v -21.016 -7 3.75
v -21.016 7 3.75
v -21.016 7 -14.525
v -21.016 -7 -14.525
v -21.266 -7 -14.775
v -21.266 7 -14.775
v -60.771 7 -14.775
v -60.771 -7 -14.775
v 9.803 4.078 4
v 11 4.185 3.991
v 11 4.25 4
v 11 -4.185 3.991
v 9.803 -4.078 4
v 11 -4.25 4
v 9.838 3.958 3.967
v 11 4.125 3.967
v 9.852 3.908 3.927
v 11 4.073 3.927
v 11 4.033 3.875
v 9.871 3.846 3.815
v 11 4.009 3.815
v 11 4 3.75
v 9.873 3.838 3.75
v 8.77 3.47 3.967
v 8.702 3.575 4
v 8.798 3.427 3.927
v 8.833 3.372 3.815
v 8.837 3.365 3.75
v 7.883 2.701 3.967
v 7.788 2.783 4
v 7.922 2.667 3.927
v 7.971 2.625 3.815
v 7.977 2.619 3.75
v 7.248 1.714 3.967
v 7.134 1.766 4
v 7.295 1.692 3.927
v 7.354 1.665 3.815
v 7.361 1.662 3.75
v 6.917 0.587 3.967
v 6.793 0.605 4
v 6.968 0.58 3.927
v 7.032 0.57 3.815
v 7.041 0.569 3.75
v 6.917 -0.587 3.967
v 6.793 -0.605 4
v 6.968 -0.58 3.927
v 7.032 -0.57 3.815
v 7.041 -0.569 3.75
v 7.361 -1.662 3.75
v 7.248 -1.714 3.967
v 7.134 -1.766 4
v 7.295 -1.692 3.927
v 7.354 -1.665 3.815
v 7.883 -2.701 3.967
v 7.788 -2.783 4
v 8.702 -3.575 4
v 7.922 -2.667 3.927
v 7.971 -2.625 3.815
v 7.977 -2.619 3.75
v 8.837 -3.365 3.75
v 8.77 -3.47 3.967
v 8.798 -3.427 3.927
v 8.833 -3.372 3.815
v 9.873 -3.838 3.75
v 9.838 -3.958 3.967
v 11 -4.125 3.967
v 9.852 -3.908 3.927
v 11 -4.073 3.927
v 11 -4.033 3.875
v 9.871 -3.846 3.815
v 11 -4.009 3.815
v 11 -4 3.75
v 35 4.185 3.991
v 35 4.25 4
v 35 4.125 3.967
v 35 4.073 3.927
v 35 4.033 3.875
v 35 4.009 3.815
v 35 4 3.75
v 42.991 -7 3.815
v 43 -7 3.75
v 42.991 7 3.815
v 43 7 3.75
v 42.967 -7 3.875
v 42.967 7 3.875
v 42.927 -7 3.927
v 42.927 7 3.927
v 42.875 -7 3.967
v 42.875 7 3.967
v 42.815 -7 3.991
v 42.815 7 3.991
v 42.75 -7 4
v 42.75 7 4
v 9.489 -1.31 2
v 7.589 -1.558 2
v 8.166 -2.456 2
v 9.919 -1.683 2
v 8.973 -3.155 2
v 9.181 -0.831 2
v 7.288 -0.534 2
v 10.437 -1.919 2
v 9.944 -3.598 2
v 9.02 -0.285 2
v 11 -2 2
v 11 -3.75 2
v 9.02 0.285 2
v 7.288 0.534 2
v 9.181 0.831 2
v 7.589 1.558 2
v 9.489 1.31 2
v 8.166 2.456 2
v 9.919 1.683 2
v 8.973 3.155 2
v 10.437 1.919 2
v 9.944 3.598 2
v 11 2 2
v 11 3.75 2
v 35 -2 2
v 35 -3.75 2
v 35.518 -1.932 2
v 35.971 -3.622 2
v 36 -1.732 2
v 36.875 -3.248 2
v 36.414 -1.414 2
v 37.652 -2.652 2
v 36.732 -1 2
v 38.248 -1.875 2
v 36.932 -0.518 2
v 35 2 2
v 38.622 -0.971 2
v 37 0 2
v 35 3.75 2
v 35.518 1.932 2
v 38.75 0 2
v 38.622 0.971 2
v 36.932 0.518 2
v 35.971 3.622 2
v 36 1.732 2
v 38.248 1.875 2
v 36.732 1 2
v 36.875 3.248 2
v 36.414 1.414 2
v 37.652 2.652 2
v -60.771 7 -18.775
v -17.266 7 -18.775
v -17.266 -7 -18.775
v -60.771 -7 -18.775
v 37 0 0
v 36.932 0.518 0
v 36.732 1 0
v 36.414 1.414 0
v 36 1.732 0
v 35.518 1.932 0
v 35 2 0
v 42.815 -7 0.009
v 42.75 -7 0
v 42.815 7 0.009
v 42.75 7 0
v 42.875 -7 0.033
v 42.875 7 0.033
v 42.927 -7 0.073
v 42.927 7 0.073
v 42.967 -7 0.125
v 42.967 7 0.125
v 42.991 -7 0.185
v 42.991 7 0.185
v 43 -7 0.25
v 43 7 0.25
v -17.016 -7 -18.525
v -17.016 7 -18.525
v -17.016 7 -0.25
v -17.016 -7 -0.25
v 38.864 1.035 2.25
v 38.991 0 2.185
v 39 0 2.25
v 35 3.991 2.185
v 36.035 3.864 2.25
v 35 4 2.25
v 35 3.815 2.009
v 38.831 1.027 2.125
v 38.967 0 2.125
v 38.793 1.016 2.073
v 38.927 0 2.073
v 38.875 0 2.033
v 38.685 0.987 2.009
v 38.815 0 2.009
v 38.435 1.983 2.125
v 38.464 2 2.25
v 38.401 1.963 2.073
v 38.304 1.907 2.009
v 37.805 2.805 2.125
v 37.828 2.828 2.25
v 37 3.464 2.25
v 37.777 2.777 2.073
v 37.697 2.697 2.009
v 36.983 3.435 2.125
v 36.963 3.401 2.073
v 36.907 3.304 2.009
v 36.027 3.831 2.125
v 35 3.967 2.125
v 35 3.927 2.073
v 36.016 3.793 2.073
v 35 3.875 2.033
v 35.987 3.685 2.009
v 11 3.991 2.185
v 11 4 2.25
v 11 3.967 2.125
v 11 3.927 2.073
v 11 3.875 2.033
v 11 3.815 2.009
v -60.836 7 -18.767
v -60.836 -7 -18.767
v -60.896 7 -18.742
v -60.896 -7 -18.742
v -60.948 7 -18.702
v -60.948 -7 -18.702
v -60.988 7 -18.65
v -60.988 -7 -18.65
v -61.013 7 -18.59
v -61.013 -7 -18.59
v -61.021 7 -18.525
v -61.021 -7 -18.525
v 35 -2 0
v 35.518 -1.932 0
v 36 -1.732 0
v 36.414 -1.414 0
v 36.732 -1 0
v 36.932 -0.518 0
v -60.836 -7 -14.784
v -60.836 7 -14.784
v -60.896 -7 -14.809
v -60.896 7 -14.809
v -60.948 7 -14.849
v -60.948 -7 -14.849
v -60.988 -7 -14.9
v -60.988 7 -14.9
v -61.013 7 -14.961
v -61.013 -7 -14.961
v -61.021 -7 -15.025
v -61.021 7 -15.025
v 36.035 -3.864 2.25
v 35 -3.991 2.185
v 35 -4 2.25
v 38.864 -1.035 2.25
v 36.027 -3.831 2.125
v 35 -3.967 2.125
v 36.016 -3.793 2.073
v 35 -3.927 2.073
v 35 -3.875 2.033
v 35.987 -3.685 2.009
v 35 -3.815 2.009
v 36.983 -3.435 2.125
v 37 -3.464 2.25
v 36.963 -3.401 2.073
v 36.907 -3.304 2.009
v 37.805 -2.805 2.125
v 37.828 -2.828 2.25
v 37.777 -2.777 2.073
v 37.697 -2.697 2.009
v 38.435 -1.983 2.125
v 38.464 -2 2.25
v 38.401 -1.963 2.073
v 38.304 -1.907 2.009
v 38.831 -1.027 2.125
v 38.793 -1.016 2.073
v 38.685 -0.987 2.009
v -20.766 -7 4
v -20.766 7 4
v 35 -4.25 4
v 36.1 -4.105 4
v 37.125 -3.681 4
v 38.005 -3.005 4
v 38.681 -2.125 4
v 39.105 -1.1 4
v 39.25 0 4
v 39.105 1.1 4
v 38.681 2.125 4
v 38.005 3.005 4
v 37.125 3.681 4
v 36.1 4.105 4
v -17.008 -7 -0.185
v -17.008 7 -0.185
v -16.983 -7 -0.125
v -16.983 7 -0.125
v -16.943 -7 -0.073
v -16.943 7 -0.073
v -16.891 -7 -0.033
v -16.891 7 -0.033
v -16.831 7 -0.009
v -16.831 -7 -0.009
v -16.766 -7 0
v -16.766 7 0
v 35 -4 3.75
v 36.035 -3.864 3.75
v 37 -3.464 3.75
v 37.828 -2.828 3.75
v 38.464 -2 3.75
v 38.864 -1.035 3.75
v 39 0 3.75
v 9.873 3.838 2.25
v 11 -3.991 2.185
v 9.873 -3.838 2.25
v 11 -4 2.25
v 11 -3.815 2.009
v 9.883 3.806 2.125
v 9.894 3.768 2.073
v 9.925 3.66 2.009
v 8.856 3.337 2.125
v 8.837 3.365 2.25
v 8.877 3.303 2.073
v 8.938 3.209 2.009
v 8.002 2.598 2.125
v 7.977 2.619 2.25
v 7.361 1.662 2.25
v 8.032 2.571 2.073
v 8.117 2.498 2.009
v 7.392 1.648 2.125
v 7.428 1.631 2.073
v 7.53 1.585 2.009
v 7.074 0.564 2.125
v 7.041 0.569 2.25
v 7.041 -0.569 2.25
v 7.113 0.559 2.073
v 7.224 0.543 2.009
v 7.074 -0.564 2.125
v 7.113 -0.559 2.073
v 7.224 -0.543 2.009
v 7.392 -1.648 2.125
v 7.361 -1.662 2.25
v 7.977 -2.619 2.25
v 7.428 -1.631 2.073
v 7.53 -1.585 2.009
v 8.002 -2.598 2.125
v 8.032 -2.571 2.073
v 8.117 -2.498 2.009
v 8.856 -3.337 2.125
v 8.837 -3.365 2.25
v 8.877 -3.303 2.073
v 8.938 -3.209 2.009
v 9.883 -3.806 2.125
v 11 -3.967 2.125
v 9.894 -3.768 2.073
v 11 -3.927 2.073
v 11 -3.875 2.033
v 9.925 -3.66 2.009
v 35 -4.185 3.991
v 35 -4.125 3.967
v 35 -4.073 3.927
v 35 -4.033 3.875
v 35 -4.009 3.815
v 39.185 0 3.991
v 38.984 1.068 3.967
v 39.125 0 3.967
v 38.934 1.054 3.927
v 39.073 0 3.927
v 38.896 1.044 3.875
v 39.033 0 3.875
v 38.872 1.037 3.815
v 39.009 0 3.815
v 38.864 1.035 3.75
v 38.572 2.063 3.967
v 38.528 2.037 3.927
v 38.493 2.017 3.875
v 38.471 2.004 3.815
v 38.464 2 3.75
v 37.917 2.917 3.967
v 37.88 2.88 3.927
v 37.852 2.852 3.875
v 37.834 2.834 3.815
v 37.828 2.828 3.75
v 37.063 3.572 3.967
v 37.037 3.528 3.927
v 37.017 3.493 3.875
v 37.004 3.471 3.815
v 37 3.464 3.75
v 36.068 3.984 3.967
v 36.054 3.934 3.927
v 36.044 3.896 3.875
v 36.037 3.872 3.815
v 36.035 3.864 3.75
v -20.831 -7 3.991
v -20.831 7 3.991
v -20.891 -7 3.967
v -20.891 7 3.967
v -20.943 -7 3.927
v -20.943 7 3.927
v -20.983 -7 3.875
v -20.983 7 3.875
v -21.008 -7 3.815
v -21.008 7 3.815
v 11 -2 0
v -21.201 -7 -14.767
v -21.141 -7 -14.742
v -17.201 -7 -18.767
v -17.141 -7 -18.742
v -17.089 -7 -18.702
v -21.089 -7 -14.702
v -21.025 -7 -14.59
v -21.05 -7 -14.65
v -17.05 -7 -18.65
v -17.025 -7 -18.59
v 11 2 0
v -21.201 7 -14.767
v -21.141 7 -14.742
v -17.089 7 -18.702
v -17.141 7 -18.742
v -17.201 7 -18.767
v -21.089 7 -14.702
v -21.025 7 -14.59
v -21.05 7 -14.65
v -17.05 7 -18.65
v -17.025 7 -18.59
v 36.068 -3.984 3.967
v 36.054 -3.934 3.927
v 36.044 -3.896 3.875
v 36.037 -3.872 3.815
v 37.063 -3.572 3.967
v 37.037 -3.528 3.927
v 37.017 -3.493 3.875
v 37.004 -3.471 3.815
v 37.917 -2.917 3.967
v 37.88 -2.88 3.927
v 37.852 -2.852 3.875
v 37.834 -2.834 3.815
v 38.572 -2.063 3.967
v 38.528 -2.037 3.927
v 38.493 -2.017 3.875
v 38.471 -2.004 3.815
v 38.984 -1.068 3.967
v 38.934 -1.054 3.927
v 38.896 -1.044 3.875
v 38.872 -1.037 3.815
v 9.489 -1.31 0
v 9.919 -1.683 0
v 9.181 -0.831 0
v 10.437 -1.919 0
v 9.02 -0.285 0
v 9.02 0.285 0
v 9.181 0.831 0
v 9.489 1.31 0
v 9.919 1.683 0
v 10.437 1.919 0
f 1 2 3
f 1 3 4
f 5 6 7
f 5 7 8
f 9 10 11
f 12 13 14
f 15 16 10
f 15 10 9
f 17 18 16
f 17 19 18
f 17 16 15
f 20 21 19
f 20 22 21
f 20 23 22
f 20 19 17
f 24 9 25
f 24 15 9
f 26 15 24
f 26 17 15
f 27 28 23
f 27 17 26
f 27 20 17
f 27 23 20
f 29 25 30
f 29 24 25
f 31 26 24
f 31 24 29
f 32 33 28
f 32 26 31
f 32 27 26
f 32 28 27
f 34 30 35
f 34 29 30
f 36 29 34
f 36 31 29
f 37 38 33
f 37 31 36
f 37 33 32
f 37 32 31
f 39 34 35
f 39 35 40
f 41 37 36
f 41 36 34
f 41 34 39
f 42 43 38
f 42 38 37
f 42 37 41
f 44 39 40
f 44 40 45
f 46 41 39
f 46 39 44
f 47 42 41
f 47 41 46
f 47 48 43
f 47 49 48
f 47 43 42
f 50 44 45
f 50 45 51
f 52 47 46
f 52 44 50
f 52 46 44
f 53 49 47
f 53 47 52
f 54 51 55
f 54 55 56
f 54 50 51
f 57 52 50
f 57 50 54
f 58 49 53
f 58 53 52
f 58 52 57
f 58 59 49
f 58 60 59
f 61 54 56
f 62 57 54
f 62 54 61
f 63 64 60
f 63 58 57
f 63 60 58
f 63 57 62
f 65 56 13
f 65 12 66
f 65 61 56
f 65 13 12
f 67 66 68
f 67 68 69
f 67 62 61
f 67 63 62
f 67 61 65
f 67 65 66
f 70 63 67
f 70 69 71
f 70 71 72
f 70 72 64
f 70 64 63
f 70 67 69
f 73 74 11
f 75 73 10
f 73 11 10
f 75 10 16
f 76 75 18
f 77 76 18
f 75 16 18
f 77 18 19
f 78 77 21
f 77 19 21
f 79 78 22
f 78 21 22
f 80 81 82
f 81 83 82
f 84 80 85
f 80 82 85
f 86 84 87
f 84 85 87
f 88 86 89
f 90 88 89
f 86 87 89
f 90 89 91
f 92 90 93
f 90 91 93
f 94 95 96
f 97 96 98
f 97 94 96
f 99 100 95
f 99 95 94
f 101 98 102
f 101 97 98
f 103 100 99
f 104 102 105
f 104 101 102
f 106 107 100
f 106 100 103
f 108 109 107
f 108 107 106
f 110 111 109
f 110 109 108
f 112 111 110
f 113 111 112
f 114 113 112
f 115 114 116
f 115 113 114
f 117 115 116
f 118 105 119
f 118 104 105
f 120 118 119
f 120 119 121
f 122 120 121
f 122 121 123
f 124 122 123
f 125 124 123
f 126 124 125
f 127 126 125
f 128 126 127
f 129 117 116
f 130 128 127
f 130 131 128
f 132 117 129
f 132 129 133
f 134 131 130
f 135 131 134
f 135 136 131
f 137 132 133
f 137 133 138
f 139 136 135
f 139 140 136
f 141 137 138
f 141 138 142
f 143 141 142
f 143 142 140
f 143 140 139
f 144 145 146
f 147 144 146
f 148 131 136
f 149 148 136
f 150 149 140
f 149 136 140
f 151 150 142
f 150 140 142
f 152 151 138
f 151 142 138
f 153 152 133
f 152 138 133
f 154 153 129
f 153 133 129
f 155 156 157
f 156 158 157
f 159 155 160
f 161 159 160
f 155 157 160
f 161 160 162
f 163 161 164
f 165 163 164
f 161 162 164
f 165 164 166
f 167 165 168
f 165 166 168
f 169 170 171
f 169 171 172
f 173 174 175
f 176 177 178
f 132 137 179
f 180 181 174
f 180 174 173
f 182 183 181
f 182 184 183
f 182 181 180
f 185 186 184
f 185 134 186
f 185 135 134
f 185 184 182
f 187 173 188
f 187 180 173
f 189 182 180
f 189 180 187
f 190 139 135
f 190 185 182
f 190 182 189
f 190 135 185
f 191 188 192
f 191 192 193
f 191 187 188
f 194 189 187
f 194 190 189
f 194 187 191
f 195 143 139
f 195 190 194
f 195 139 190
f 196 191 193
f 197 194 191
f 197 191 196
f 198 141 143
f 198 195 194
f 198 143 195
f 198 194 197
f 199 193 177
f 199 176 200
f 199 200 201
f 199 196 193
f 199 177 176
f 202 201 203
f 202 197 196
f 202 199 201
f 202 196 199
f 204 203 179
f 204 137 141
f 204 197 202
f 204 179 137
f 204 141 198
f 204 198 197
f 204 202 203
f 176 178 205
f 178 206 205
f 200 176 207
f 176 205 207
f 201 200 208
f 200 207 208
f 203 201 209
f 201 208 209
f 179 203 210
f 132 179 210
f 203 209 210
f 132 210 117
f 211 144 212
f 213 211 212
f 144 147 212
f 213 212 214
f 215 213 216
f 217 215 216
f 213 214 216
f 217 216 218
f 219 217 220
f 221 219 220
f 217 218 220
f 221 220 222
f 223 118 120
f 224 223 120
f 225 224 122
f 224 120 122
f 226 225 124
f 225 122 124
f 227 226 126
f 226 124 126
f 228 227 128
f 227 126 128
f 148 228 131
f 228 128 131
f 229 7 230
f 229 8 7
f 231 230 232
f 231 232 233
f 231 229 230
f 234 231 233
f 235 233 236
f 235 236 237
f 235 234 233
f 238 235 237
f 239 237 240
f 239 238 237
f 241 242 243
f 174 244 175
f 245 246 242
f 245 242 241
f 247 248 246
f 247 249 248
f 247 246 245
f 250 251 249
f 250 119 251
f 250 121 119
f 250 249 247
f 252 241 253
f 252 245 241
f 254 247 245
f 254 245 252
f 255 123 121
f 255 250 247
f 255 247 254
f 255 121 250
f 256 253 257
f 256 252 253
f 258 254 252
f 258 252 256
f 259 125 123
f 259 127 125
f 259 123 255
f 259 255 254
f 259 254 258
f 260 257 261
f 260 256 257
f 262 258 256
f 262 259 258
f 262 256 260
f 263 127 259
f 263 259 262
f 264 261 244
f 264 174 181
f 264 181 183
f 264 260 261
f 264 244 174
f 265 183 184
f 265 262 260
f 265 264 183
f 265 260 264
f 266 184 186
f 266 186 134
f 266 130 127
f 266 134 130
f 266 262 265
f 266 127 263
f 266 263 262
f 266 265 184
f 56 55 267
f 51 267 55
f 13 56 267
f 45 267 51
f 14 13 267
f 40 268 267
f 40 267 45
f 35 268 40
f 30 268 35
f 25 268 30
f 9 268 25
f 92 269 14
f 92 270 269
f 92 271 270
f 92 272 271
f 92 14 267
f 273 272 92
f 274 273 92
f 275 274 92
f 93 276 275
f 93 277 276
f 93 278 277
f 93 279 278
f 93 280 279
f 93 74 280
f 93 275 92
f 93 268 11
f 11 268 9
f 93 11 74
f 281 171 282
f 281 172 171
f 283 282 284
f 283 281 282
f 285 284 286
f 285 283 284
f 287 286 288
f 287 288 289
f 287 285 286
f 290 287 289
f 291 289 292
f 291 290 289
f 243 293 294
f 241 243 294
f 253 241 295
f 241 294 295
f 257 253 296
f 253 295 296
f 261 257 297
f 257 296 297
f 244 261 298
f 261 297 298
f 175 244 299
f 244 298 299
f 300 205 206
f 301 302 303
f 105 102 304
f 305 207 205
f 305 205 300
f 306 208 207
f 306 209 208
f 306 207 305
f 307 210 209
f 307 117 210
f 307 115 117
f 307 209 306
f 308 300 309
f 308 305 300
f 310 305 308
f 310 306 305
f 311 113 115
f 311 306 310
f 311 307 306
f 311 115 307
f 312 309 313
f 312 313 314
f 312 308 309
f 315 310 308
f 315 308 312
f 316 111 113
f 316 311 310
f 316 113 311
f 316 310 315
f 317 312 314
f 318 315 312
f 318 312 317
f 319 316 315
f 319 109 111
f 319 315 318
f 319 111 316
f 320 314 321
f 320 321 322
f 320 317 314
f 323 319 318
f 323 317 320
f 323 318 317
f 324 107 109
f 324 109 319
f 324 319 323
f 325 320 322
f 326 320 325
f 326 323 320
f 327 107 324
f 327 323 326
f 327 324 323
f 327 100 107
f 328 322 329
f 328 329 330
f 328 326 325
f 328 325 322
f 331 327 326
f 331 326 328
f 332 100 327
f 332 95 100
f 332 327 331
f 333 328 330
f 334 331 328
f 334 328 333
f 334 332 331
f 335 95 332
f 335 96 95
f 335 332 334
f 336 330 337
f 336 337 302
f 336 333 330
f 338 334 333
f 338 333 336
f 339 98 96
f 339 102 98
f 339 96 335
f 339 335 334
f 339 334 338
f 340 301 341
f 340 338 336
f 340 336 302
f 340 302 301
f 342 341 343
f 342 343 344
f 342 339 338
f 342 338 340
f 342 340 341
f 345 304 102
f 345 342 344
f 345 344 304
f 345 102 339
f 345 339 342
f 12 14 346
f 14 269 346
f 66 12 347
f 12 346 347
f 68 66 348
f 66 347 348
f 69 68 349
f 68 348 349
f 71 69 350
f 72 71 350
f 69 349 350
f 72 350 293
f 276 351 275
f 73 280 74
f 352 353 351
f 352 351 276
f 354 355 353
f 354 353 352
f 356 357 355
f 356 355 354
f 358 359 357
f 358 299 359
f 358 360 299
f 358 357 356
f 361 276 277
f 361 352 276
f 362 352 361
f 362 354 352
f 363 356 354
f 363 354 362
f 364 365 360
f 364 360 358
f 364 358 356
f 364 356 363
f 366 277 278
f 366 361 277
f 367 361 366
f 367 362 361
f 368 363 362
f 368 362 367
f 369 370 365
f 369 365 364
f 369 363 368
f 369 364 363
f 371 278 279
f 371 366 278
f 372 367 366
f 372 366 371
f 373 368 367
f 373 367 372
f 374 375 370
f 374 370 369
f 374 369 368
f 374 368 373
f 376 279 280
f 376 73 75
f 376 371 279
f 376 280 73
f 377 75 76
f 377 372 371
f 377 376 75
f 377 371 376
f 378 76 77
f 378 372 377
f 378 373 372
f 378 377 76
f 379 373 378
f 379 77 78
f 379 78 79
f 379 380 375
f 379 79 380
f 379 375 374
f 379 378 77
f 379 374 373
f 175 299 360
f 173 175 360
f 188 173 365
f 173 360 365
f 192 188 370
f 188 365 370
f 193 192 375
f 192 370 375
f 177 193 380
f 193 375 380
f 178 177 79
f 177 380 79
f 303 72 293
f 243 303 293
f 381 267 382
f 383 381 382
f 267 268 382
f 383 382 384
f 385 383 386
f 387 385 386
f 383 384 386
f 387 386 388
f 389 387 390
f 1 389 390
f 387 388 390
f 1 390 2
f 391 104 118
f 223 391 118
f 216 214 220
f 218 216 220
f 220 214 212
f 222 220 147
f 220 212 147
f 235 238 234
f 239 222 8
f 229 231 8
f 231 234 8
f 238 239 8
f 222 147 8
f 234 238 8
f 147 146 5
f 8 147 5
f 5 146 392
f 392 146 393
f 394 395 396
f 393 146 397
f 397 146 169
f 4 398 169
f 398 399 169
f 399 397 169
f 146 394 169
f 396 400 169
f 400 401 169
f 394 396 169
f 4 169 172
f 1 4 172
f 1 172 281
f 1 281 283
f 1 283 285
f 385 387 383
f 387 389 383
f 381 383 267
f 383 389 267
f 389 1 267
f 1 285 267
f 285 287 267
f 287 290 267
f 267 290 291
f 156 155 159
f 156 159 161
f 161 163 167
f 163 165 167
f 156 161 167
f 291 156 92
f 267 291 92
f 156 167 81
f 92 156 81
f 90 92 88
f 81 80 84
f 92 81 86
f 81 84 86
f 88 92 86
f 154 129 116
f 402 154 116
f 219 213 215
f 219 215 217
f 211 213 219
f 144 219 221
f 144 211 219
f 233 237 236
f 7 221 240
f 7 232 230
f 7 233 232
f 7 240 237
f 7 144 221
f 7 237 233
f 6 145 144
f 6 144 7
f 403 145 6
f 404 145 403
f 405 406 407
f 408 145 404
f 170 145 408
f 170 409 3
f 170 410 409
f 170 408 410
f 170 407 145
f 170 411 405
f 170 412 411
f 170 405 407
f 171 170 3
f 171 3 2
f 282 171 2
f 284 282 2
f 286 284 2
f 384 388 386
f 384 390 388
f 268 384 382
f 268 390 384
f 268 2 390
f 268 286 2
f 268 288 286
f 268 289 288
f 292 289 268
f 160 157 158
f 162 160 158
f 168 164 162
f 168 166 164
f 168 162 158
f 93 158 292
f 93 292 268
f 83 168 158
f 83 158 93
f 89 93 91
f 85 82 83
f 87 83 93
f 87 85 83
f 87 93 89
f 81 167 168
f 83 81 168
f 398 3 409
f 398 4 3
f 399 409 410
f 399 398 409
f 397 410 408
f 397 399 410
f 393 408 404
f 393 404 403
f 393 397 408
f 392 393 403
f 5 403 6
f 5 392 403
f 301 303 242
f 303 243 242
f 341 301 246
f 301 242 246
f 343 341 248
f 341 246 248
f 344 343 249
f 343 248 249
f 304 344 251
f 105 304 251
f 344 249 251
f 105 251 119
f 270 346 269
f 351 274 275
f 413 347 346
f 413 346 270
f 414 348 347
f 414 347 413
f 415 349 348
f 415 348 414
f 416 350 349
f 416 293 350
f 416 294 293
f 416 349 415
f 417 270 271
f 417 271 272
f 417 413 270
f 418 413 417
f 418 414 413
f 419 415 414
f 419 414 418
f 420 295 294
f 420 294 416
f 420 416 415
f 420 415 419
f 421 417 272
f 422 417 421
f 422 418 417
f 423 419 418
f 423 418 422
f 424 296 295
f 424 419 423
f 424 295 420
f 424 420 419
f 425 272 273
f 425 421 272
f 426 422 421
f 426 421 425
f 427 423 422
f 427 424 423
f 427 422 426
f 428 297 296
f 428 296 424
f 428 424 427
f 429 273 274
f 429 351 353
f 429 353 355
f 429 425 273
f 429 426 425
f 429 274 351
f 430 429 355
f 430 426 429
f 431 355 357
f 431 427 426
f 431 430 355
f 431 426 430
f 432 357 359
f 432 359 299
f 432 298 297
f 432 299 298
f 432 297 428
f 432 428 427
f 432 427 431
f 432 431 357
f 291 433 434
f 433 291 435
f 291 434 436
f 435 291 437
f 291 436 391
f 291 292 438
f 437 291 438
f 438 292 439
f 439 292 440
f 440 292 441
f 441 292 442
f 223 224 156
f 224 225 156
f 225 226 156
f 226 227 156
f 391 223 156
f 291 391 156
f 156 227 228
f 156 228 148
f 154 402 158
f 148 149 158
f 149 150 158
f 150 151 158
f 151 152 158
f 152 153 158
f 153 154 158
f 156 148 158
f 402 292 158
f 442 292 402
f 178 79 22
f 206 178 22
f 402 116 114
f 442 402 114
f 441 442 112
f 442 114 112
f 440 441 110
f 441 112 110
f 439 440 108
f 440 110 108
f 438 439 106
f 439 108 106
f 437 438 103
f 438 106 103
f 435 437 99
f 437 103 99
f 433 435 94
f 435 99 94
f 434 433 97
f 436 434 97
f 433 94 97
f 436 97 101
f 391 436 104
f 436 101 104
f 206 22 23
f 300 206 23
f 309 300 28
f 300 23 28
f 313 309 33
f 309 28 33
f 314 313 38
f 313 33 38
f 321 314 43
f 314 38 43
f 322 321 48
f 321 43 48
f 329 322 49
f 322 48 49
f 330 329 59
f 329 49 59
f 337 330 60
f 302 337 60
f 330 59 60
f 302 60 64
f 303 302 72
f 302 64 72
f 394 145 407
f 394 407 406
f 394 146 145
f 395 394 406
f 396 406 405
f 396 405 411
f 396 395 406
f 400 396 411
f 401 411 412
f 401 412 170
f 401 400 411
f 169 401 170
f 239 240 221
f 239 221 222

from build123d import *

# Parameters (mm, degrees)
F0_W      = 86
F0_H      = 14
F1_DEPTH  = 4
F3_DEPTH  = 4
F5_DEPTH  = 2
F6_R      = 0.25
F7_W      = 21.9838
F7_H      = 14
F8_DEPTH  = 4
F9_W      = 4
F9_H      = 14
F10_DEPTH = 18.7753
F11_W     = 14
F11_H     = 4
F12_DEPTH = 40.005
F13_R     = 0.25


with BuildPart() as f1:
    # F0 (on Top) → F1 (new body)
    with BuildSketch(Plane.XY):
        Rectangle(F0_W, F0_H)
    extrude(amount=F1_DEPTH)

    # F2 (on face) → F3 (cut)
    with BuildSketch(Plane.XY.offset(4)):
        with BuildLine():
            ThreePointArc((35, -2), (36.4142139414, -1.4142137697), (37.0000005863, 0))
            ThreePointArc((37.0000005863, 0), (36.4142139414, 1.4142137697), (35, 2))
            Line((35, 2), (35, -2))
        make_face()
        with BuildLine():
            Line((35, -2), (35, 2))
            ThreePointArc((35, 2), (33.0000005863, 0), (35, -2))
        make_face()
        with BuildLine():
            ThreePointArc((35, -2), (33.0000005863, 0), (35, 2))
            Line((35, 2), (11, 2))
            ThreePointArc((11, 2), (12.4142135624, 1.4142135624), (13, 0))
            ThreePointArc((13, 0), (12.4142135624, -1.4142135624), (11, -2))
            Line((11, -2), (35, -2))
        make_face()
        with BuildLine():
            Line((11, -2), (11, 2))
            ThreePointArc((11, 2), (9, 0), (11, -2))
        make_face()
        with BuildLine():
            ThreePointArc((13, 0), (12.4142135624, 1.4142135624), (11, 2))
            Line((11, 2), (11, -2))
            ThreePointArc((11, -2), (12.4142135624, -1.4142135624), (13, 0))
        make_face()
    extrude(amount=-F3_DEPTH, mode=Mode.SUBTRACT)

    # F4 (on face) → F5 (cut)
    with BuildSketch(Plane.XY.offset(4)):
        with BuildLine():
            ThreePointArc((35.0000005863, -4), (37.8284277111, -2.8284271247), (39.0000005863, 0))
            ThreePointArc((39.0000005863, 0), (37.8284277111, 2.8284271247), (35.0000005863, 4))
            Line((35.0000005863, 4), (35.0000005863, -4))
        make_face()
        with BuildLine():
            Line((35.0000005863, -4), (35.0000005863, 4))
            ThreePointArc((35.0000005863, 4), (31.0000005863, 0), (35.0000005863, -4))
        make_face()
        with BuildLine():
            ThreePointArc((35.0000005863, -4), (31.0000005863, 0), (35.0000005863, 4))
            Line((35.0000005863, 4), (11.0000005863, 4))
            ThreePointArc((11.0000005863, 4), (13.828427332, 2.8284269175), (15, 0))
            ThreePointArc((15, 0), (13.828427332, -2.8284269175), (11.0000005863, -4))
            Line((11.0000005863, -4), (35.0000005863, -4))
        make_face()
        with BuildLine():
            Line((11.0000005863, -4), (11.0000005863, 4))
            ThreePointArc((11.0000005863, 4), (7, 0), (11.0000005863, -4))
        make_face()
        with BuildLine():
            ThreePointArc((15, 0), (13.828427332, 2.8284269175), (11.0000005863, 4))
            Line((11.0000005863, 4), (11.0000005863, -4))
            ThreePointArc((11.0000005863, -4), (13.828427332, -2.8284269175), (15, 0))
        make_face()
    extrude(amount=-F5_DEPTH, mode=Mode.SUBTRACT)

    # F6
    f6_edges = [f1.edges().sort_by_distance(p)[0] for p in [
        (23.000001, 4, 2),
        (7, 0, 2),
        (23.000001, -4, 2),
        (39.000001, 0, 2),
        (23.000001, -4, 4),
        (7, 0, 4),
        (23.000001, 4, 4),
        (39.000001, 0, 4),
    ]]
    fillet(f6_edges, radius=F6_R)

    # F7 (on face) → F8 (cut)
    with BuildSketch(Plane.XY.offset(4)):
        with Locations((-32.0081, 0)):
            Rectangle(F7_W, F7_H)
    extrude(amount=-F8_DEPTH, mode=Mode.SUBTRACT)

    # F9 (on face) → F10 (join)
    with BuildSketch(Plane(origin=(0, 0, 0), x_dir=(1, 0, 0), z_dir=(0, 0, -1))):
        with Locations((-19.0162, 0)):
            Rectangle(F9_W, F9_H)
    extrude(amount=F10_DEPTH)

    # F11 (on face) → F12 (join)
    with BuildSketch(Plane(origin=(-21.0162, 0, 0), x_dir=(0, -1, 0), z_dir=(-1, 0, 0))):
        with Locations((0, -16.7753)):
            Rectangle(F11_W, F11_H)
    extrude(amount=F12_DEPTH)

    # F13
    f13_edges = [f1.edges().sort_by_distance(p)[0] for p in [
        (-17.0162, 0, 0),
        (-17.0162, 0, -18.7753),
        (43, 0, 0),
        (43, 0, 4),
        (-21.0162, 0, -14.7753),
        (-21.0162, 0, 4),
        (-61.0212, 0, -14.7753),
        (-61.0212, 0, -18.7753),
    ]]
    fillet(f13_edges, radius=F13_R)


solid = f1.part
